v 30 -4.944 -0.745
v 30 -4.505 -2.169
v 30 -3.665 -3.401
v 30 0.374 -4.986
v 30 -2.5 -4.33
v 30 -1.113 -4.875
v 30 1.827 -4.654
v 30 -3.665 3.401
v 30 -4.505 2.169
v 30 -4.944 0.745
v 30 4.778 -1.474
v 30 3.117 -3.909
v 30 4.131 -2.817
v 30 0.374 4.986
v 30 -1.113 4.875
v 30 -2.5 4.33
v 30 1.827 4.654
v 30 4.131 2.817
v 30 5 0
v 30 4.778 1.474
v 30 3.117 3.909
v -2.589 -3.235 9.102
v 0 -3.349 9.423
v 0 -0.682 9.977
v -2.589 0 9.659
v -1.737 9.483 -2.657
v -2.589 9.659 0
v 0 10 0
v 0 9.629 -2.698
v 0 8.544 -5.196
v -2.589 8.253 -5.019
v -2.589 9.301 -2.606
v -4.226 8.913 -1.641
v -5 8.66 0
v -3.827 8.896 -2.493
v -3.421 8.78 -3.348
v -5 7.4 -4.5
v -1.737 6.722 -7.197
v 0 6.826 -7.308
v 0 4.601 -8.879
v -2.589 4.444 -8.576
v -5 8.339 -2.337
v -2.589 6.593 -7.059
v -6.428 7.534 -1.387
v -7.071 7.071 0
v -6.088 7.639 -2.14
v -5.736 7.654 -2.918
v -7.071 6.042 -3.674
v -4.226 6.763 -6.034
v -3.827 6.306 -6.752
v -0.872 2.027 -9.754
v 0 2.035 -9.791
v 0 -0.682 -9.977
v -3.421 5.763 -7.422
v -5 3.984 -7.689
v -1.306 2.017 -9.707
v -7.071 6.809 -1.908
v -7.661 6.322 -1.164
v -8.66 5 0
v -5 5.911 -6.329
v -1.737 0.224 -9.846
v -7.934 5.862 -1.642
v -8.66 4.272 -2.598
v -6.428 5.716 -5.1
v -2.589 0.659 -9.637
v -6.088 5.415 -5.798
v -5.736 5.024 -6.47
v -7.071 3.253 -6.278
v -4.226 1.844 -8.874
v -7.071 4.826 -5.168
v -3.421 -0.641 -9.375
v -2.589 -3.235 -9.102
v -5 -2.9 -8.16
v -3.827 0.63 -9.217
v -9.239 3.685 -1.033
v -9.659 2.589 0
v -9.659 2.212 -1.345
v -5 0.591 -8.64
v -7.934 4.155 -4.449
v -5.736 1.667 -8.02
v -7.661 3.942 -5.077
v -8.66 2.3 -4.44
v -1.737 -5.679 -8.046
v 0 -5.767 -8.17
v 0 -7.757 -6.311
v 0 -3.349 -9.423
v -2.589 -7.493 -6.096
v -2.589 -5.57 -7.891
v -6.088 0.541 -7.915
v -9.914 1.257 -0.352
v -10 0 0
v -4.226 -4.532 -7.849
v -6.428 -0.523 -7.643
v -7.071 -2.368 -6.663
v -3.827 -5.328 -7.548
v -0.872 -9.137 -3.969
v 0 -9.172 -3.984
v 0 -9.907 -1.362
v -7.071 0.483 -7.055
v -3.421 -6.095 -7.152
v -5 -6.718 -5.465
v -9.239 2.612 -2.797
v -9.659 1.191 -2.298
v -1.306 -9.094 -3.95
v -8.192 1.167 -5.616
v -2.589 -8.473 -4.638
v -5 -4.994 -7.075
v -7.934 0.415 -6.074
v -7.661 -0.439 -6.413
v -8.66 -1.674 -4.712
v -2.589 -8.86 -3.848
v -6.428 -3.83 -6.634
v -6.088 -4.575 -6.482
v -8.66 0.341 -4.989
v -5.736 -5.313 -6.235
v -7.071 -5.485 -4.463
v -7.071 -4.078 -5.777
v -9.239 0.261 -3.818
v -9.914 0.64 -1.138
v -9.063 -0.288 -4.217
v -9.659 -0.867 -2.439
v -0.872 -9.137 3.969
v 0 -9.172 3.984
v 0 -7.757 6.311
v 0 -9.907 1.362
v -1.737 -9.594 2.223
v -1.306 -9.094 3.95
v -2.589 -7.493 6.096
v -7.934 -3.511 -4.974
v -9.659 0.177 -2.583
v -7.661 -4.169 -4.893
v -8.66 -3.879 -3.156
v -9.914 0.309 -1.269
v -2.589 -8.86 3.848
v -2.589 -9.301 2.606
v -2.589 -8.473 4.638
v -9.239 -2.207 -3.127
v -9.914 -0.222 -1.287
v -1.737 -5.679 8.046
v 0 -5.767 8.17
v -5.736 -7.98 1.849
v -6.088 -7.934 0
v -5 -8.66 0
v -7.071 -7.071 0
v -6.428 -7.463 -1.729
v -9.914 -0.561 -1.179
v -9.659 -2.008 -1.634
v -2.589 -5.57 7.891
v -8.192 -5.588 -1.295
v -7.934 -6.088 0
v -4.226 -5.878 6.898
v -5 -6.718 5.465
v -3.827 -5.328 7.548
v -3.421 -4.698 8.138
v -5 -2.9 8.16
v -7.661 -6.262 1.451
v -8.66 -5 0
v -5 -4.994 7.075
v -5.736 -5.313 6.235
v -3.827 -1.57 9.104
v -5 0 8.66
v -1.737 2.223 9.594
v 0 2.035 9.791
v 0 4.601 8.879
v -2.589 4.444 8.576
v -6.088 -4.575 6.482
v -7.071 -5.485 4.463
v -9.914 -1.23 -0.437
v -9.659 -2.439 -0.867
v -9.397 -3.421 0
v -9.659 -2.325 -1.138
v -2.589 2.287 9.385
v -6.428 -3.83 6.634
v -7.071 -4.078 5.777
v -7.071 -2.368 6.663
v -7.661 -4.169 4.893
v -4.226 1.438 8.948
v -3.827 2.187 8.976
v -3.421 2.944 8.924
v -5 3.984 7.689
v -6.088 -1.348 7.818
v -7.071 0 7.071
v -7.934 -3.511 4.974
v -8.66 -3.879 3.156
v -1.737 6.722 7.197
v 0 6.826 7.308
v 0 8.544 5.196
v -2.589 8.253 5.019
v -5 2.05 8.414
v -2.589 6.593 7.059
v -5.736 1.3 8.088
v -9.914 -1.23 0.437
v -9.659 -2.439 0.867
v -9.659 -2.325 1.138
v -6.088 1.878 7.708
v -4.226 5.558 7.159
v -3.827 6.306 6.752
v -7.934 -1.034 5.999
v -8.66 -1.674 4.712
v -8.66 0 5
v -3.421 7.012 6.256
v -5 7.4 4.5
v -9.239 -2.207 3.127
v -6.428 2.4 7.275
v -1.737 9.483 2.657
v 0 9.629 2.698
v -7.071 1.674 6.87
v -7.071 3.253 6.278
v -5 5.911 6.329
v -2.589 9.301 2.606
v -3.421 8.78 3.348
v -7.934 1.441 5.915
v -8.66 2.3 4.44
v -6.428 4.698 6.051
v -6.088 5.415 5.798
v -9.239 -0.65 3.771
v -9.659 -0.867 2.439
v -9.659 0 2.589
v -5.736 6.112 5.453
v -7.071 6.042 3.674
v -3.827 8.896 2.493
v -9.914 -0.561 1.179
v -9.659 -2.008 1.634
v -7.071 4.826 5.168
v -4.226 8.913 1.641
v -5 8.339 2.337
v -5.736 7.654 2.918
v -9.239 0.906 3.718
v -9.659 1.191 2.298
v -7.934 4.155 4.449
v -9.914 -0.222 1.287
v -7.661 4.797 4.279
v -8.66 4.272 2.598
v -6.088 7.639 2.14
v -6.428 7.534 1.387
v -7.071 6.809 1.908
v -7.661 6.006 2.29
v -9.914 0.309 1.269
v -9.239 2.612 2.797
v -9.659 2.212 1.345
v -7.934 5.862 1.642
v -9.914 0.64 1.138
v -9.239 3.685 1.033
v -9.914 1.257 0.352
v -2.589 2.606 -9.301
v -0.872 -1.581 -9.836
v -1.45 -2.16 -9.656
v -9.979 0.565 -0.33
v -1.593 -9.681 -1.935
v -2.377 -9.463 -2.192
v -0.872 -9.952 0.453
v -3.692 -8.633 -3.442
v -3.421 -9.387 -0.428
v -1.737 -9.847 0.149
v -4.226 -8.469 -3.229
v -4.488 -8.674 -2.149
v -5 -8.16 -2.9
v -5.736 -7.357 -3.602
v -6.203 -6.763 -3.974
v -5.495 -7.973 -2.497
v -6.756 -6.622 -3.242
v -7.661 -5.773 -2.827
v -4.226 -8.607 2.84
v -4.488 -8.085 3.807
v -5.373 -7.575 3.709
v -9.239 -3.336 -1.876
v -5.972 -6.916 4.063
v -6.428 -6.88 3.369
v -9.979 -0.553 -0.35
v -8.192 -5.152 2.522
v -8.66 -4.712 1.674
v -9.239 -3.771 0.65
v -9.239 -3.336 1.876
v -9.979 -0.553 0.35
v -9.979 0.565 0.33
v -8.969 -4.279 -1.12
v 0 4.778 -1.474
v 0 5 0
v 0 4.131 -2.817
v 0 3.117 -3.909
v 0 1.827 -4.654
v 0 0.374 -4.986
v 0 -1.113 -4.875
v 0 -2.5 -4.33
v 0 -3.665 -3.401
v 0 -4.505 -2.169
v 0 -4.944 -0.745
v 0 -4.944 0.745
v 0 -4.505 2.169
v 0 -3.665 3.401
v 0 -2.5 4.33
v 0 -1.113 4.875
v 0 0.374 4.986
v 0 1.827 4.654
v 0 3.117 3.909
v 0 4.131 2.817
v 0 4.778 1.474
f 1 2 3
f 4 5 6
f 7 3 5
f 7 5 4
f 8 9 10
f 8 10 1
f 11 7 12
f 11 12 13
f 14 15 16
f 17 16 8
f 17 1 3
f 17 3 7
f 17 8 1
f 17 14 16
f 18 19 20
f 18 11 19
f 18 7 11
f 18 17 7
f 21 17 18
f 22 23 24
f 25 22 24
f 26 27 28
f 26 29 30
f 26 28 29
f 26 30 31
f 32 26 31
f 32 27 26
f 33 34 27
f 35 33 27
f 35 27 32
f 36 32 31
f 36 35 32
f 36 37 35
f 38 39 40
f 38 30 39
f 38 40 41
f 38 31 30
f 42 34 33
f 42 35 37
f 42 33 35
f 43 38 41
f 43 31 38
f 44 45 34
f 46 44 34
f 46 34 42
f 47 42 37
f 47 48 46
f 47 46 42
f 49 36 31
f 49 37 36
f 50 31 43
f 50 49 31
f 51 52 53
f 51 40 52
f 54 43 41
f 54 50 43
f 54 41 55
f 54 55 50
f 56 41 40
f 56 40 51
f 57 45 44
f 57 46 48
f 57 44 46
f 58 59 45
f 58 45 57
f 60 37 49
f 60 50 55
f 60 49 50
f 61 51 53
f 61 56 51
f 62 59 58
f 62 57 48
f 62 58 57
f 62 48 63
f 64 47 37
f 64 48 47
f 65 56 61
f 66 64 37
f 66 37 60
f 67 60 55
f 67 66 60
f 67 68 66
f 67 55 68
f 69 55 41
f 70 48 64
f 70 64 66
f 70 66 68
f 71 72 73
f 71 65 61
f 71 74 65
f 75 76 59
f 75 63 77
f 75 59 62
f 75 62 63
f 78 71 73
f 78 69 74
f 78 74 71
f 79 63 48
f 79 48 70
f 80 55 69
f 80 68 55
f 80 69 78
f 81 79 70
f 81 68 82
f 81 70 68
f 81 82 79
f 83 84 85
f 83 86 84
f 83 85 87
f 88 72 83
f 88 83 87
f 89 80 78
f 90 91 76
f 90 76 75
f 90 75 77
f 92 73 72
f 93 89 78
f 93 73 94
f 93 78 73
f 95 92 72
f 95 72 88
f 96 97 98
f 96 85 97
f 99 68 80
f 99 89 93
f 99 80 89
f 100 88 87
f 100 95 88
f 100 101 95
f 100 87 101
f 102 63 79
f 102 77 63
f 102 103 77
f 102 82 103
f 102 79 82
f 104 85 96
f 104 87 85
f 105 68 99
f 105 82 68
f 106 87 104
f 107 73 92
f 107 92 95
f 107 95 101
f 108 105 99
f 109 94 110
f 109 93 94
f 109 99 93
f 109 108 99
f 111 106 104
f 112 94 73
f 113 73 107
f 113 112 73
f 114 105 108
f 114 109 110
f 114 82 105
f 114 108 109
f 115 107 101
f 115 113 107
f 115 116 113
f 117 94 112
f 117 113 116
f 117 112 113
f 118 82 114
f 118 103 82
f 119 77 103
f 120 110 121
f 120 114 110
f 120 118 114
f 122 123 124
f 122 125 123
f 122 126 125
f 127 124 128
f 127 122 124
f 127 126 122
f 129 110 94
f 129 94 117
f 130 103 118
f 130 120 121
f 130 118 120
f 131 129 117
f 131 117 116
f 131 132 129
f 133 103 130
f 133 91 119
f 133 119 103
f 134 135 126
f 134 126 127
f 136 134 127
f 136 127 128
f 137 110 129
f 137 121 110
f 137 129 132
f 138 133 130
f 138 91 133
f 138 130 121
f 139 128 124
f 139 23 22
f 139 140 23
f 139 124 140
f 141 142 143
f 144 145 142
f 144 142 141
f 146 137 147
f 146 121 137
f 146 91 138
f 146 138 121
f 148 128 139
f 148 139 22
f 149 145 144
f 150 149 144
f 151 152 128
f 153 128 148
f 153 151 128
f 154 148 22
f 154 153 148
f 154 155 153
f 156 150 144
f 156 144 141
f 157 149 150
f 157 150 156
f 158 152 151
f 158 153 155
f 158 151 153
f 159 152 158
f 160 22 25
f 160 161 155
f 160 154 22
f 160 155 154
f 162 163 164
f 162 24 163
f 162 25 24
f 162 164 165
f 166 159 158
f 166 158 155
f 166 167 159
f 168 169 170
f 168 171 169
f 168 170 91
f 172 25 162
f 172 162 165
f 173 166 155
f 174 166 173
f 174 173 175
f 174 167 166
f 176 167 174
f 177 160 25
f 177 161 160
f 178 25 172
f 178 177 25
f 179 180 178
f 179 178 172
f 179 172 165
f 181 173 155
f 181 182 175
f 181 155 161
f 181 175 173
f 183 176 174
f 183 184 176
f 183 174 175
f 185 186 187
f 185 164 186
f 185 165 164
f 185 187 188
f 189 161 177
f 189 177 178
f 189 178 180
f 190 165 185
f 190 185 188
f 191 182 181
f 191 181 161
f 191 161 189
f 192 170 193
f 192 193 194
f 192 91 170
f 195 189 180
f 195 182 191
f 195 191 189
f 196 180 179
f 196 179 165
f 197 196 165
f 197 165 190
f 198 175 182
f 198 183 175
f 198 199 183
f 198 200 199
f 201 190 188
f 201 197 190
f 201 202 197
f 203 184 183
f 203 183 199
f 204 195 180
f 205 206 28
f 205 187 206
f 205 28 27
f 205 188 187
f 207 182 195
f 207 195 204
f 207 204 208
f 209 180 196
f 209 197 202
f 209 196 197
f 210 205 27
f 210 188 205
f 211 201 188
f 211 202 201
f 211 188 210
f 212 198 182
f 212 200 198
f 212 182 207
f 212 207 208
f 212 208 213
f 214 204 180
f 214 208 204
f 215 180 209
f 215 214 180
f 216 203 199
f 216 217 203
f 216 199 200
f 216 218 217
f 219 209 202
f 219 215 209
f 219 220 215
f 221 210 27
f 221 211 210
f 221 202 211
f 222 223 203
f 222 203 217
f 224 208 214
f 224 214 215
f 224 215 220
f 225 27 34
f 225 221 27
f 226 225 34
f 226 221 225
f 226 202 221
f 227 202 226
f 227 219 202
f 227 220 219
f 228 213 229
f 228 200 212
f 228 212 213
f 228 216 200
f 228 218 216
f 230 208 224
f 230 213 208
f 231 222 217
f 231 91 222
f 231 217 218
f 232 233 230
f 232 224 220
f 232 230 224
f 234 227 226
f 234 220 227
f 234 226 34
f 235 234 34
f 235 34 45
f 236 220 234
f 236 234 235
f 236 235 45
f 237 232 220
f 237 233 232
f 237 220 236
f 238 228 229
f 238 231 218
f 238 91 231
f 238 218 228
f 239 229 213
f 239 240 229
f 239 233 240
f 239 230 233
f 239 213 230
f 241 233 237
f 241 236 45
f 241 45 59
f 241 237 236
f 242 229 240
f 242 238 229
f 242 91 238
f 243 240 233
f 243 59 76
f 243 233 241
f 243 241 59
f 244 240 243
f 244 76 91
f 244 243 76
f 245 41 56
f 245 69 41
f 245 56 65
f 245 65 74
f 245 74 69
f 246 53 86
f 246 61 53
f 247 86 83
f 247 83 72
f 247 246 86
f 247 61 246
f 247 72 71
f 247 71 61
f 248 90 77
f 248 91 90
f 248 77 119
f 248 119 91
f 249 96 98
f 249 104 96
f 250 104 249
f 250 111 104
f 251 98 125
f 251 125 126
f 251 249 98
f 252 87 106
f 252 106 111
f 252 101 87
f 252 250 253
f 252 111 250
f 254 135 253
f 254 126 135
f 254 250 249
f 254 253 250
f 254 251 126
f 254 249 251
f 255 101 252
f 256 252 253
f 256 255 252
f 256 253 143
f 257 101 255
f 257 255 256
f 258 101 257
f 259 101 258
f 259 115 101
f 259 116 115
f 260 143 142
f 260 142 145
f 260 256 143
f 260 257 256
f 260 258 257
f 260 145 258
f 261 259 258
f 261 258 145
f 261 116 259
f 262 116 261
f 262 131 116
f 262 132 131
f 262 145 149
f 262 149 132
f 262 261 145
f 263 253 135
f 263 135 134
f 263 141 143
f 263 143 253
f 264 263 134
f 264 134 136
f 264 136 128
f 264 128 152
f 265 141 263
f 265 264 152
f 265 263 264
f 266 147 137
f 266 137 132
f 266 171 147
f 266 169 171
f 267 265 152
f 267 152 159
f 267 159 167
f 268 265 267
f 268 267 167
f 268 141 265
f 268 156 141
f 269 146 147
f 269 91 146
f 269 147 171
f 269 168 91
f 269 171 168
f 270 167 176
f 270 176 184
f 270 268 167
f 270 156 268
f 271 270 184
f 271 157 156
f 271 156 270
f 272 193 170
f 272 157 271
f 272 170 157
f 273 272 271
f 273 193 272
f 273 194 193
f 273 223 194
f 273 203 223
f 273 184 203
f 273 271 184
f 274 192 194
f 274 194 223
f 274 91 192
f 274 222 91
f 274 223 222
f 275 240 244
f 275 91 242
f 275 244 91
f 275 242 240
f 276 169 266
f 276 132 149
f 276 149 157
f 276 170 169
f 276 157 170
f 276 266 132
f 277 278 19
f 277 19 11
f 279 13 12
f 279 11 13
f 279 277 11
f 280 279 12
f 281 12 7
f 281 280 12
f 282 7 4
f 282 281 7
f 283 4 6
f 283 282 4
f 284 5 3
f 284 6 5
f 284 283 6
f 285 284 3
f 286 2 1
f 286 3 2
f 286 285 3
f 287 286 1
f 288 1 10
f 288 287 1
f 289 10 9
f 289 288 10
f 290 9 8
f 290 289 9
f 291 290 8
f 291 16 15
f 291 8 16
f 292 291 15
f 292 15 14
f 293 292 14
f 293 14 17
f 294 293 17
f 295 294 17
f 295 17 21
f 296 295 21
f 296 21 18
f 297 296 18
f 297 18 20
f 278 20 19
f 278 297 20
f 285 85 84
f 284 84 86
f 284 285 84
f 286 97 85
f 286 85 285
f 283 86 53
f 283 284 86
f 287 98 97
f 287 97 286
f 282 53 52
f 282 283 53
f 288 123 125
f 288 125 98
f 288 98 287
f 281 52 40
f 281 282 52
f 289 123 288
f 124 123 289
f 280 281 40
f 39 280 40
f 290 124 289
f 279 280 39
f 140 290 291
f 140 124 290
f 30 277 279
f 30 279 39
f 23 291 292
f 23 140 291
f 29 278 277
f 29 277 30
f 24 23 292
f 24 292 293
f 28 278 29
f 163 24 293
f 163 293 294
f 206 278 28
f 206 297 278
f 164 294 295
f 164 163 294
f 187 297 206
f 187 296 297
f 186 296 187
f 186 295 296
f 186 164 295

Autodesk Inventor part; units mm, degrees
ref_plane "YZ Plane" through (0, 0, 0) normal (1, 0, 0) x (0, 1, 0)
ref_plane "XZ Plane" through (0, 0, 0) normal (0, 1, 0) x (-1, 0, 0)
ref_plane "XY Plane" through (0, 0, 0) normal (0, 0, 1) x (1, 0, 0)
sketch "Skizze1" plane through (0, 0, 0) normal (1, 0, 0) x (0, 1, 0)
  circle A0 centre (0, 0) radius 5
  circle A1 centre (0, 0) radius 10
  dimension "d0" = 10
  dimension "d3" = 5
extrude "Extrusion1" add sketch "Skizze1" along normal blind 30 contours A0
extrude "Extrusion2" add sketch "Skizze1" against normal blind 10 contours A0 | A1
fillet "Rundung1" radius 10 1 edges at (-10, -10, 0)
equation "\"d4\" = d3 + 0.5 * d0"
equation "\"d6\" = d3 + 0.5 * d0"
properties part number "FilmLamp-Clamp"
